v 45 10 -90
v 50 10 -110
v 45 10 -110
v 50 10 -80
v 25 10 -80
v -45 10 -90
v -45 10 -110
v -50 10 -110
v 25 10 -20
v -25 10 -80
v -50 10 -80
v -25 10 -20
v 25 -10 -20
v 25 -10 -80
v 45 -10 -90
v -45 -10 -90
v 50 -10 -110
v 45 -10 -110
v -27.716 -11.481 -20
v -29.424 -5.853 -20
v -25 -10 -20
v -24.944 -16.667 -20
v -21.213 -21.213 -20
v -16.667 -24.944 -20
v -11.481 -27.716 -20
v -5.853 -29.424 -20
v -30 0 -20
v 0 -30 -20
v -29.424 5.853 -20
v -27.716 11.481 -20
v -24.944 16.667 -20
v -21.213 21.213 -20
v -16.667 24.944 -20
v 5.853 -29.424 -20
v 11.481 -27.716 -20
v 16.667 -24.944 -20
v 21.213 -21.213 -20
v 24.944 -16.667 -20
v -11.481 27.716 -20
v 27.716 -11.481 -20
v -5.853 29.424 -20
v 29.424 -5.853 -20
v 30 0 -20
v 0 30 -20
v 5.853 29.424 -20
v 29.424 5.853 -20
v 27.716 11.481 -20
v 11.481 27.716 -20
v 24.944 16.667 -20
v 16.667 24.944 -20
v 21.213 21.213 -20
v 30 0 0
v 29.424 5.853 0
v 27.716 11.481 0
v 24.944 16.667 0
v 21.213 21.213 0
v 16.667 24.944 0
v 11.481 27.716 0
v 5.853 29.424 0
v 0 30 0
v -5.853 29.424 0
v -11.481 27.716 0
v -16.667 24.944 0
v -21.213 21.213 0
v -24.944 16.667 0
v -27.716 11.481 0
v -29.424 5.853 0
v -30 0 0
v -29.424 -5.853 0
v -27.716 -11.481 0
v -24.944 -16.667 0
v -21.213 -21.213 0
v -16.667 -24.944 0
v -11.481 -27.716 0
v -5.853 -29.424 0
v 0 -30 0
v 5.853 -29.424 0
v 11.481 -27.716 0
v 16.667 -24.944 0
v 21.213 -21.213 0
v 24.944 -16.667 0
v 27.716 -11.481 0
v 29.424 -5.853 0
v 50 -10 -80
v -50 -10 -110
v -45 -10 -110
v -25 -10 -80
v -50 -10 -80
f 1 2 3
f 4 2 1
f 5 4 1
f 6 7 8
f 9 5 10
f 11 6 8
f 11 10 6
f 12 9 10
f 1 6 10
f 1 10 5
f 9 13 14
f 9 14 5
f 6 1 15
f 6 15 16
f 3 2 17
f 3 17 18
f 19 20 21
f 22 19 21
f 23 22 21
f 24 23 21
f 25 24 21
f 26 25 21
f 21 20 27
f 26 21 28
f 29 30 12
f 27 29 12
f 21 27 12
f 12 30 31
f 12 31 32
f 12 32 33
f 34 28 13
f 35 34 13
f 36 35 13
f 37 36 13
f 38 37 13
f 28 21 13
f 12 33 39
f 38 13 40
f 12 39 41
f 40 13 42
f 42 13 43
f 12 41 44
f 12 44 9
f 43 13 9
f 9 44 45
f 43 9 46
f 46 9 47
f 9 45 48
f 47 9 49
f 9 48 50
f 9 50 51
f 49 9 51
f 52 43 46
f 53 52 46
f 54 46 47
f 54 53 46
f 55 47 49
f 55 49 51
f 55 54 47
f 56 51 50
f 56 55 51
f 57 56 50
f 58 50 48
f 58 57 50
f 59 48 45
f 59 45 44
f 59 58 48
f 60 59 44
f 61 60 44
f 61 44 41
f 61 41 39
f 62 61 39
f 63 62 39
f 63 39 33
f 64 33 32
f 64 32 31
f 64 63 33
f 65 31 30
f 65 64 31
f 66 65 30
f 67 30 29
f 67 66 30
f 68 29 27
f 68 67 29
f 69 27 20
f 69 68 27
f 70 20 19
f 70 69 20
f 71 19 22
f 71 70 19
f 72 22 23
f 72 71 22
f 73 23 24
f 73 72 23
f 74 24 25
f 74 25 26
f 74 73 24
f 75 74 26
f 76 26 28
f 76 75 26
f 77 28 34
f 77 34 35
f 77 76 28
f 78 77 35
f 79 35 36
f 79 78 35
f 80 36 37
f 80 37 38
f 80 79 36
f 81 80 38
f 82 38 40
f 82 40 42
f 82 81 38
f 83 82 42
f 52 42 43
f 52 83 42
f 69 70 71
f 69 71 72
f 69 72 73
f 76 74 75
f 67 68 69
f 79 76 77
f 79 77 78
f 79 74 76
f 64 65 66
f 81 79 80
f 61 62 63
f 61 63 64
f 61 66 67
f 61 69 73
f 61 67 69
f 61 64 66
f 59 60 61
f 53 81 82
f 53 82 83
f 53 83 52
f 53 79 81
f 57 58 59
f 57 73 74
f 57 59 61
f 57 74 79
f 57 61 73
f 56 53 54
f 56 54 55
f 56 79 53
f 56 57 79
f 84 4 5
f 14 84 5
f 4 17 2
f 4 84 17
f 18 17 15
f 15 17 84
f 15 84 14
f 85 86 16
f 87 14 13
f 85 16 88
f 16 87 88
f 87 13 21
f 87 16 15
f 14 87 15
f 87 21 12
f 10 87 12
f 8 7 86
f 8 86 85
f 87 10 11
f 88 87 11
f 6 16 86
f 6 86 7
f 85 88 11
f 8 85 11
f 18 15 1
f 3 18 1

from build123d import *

# Parameters (mm, degrees)
SKETCH1_R           = 30
BOSS_EXTRUDE1_DEPTH = 20
SKETCH3_W           = 50
SKETCH3_H           = 20
BOSS_EXTRUDE2_DEPTH = 60
SKETCH4_W           = 100
SKETCH4_H           = 20
BOSS_EXTRUDE3_DEPTH = 10
SKETCH5_W           = 5
SKETCH5_H           = 20
BOSS_EXTRUDE4_DEPTH = 20


with BuildPart() as part:
    # Sketch1 → Boss-Extrude1 (new body)
    with BuildSketch(Plane.XY):
        Circle(SKETCH1_R)
    extrude(amount=-BOSS_EXTRUDE1_DEPTH)

    # Sketch3 → Boss-Extrude2 (add)
    with BuildSketch(Plane(origin=(0, 0, -20), x_dir=(-1, 0, 0), z_dir=(0, 0, -1))):
        Rectangle(SKETCH3_W, SKETCH3_H)
    extrude(amount=BOSS_EXTRUDE2_DEPTH)

    # Sketch4 → Boss-Extrude3 (add)
    with BuildSketch(Plane(origin=(0, 0, -80), x_dir=(-1, 0, 0), z_dir=(0, 0, -1))):
        Rectangle(SKETCH4_W, SKETCH4_H)
    extrude(amount=BOSS_EXTRUDE3_DEPTH)

    # Sketch5 → Boss-Extrude4 (add)
    with BuildSketch(Plane(origin=(0, 0, -90), x_dir=(-1, 0, 0), z_dir=(0, 0, -1))):
        with Locations((-47.5, 0)):
            Rectangle(SKETCH5_W, SKETCH5_H)
        with Locations((47.5, 0)):
            Rectangle(SKETCH5_W, SKETCH5_H)
    extrude(amount=BOSS_EXTRUDE4_DEPTH)


solid = part.part
